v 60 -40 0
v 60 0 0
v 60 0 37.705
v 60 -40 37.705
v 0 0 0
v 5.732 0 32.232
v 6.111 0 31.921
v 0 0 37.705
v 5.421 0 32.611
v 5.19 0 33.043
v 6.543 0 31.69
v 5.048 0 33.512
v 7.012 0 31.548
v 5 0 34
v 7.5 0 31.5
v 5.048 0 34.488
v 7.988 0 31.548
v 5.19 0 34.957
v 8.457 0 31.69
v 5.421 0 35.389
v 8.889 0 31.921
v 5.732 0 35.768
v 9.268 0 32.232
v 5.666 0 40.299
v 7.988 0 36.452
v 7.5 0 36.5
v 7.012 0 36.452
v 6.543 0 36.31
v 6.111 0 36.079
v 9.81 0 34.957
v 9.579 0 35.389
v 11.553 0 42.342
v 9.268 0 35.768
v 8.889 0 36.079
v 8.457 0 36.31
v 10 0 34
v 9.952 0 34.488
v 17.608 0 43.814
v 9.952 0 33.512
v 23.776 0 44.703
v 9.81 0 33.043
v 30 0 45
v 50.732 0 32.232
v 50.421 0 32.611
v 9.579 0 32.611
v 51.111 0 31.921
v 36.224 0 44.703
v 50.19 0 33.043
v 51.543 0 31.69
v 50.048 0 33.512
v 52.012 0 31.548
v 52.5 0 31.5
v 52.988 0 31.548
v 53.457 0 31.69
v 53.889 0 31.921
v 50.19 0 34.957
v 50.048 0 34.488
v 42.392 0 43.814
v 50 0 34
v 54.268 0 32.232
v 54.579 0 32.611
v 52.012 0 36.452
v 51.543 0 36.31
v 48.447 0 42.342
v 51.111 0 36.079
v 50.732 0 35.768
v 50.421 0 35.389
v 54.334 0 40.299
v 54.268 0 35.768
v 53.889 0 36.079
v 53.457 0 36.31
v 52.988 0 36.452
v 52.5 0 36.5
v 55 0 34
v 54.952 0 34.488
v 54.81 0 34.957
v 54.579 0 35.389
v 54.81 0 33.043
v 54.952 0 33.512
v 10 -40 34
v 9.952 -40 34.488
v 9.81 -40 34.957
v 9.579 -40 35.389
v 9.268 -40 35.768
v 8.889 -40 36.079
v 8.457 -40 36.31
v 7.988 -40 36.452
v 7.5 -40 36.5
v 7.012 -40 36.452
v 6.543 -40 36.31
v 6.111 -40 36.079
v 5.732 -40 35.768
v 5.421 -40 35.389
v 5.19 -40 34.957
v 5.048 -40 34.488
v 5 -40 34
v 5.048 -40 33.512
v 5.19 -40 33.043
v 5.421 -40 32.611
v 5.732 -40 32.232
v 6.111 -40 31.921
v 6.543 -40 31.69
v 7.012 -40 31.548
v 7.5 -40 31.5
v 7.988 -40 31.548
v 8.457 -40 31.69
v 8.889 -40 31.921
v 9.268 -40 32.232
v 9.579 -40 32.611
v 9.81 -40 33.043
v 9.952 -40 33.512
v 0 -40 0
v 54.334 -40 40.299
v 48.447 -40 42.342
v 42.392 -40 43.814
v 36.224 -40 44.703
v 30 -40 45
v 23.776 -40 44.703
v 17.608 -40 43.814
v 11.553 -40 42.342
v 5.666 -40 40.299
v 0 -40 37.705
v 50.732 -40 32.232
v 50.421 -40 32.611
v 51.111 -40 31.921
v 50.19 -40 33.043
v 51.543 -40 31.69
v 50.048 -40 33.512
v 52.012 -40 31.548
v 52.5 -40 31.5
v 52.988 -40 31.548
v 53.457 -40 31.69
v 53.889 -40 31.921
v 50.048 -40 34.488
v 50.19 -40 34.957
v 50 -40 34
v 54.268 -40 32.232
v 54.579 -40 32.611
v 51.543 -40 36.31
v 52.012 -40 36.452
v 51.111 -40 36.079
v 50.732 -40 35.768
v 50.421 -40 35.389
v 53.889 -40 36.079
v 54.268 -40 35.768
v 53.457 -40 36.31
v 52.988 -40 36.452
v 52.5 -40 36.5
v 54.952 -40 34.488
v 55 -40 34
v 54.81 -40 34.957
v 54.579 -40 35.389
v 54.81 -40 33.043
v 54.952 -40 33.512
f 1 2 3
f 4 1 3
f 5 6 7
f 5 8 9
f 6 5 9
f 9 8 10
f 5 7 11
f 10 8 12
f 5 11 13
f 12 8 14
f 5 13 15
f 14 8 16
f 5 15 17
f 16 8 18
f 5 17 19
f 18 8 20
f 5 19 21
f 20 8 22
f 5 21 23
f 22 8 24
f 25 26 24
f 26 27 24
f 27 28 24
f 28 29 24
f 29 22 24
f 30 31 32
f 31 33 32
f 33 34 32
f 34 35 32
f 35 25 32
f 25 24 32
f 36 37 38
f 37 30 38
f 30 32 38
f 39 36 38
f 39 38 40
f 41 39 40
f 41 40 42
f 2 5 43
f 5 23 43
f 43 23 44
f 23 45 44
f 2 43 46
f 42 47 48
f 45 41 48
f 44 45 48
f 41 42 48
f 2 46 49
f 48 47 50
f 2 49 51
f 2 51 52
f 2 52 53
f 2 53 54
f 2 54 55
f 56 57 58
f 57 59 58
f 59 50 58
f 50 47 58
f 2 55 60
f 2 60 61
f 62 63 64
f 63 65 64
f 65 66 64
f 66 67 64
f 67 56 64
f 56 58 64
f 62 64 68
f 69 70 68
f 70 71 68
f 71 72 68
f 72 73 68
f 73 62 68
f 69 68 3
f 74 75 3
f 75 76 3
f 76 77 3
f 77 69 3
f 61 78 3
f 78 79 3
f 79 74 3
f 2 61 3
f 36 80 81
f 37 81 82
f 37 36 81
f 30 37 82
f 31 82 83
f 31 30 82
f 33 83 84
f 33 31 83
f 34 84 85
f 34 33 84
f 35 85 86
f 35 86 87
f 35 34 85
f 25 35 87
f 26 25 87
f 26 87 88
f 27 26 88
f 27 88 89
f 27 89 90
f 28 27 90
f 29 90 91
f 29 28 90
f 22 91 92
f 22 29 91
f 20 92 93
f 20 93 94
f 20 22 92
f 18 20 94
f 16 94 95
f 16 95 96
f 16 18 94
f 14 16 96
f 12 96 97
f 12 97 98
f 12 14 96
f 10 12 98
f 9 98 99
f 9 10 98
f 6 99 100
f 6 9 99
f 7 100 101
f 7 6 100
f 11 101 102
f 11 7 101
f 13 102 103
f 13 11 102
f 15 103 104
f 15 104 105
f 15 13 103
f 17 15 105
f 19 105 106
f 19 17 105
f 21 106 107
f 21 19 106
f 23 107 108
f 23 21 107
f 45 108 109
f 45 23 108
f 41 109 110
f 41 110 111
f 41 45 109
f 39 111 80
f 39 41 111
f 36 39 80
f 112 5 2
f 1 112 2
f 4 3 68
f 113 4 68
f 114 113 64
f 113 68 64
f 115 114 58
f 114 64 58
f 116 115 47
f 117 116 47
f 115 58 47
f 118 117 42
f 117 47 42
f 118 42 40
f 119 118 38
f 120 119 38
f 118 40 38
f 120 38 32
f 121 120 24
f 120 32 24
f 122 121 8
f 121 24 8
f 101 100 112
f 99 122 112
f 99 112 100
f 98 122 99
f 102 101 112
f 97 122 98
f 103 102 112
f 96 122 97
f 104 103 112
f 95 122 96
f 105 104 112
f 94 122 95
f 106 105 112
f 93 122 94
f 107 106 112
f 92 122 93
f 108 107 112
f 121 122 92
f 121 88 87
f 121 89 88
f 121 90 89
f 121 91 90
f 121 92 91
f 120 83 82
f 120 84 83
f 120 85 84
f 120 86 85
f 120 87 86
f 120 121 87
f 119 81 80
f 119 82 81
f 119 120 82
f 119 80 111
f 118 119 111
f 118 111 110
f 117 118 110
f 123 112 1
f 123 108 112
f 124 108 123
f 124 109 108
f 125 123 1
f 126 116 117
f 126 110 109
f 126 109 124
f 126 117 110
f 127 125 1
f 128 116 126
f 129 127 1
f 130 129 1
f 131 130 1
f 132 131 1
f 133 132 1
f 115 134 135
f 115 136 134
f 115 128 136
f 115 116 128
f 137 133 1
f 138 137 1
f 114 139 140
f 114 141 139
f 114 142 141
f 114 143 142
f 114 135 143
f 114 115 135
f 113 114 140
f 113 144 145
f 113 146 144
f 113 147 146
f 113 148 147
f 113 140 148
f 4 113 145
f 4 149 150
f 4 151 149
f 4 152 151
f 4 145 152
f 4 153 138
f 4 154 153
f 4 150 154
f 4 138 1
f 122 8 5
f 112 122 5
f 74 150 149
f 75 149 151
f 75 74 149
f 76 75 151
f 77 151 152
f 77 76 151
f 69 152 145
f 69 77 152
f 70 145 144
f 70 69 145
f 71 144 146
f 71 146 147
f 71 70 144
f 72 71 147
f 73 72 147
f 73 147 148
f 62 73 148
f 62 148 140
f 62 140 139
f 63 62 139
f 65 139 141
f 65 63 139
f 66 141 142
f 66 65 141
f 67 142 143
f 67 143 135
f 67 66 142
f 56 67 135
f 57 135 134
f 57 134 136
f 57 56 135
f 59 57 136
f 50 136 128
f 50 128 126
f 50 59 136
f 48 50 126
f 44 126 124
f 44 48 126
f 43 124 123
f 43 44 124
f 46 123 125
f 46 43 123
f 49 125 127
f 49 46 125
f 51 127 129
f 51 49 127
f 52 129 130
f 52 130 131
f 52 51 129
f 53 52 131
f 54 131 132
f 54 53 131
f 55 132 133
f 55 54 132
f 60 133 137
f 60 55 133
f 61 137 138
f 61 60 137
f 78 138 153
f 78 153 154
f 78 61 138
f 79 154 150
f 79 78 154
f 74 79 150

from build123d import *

# Parameters (mm, degrees)
F0_R     = 2.5
F1_DEPTH = 40


with BuildPart() as f1:
    # F0 (on Front) → F1 (new body)
    with BuildSketch(Plane.XZ):
        with BuildLine():
            Line((0, 37.70469), (0, 0))
            Line((0, 0), (60, 0))
            Line((60, 0), (60, 37.70469))
            ThreePointArc((60, 37.70469), (30, 45), (0, 37.70469))
        make_face()
        with Locations((7.5, 34)):
            Circle(F0_R, mode=Mode.SUBTRACT)
        with Locations((52.5, 34)):
            Circle(F0_R, mode=Mode.SUBTRACT)
    extrude(amount=F1_DEPTH)


solid = f1.part
